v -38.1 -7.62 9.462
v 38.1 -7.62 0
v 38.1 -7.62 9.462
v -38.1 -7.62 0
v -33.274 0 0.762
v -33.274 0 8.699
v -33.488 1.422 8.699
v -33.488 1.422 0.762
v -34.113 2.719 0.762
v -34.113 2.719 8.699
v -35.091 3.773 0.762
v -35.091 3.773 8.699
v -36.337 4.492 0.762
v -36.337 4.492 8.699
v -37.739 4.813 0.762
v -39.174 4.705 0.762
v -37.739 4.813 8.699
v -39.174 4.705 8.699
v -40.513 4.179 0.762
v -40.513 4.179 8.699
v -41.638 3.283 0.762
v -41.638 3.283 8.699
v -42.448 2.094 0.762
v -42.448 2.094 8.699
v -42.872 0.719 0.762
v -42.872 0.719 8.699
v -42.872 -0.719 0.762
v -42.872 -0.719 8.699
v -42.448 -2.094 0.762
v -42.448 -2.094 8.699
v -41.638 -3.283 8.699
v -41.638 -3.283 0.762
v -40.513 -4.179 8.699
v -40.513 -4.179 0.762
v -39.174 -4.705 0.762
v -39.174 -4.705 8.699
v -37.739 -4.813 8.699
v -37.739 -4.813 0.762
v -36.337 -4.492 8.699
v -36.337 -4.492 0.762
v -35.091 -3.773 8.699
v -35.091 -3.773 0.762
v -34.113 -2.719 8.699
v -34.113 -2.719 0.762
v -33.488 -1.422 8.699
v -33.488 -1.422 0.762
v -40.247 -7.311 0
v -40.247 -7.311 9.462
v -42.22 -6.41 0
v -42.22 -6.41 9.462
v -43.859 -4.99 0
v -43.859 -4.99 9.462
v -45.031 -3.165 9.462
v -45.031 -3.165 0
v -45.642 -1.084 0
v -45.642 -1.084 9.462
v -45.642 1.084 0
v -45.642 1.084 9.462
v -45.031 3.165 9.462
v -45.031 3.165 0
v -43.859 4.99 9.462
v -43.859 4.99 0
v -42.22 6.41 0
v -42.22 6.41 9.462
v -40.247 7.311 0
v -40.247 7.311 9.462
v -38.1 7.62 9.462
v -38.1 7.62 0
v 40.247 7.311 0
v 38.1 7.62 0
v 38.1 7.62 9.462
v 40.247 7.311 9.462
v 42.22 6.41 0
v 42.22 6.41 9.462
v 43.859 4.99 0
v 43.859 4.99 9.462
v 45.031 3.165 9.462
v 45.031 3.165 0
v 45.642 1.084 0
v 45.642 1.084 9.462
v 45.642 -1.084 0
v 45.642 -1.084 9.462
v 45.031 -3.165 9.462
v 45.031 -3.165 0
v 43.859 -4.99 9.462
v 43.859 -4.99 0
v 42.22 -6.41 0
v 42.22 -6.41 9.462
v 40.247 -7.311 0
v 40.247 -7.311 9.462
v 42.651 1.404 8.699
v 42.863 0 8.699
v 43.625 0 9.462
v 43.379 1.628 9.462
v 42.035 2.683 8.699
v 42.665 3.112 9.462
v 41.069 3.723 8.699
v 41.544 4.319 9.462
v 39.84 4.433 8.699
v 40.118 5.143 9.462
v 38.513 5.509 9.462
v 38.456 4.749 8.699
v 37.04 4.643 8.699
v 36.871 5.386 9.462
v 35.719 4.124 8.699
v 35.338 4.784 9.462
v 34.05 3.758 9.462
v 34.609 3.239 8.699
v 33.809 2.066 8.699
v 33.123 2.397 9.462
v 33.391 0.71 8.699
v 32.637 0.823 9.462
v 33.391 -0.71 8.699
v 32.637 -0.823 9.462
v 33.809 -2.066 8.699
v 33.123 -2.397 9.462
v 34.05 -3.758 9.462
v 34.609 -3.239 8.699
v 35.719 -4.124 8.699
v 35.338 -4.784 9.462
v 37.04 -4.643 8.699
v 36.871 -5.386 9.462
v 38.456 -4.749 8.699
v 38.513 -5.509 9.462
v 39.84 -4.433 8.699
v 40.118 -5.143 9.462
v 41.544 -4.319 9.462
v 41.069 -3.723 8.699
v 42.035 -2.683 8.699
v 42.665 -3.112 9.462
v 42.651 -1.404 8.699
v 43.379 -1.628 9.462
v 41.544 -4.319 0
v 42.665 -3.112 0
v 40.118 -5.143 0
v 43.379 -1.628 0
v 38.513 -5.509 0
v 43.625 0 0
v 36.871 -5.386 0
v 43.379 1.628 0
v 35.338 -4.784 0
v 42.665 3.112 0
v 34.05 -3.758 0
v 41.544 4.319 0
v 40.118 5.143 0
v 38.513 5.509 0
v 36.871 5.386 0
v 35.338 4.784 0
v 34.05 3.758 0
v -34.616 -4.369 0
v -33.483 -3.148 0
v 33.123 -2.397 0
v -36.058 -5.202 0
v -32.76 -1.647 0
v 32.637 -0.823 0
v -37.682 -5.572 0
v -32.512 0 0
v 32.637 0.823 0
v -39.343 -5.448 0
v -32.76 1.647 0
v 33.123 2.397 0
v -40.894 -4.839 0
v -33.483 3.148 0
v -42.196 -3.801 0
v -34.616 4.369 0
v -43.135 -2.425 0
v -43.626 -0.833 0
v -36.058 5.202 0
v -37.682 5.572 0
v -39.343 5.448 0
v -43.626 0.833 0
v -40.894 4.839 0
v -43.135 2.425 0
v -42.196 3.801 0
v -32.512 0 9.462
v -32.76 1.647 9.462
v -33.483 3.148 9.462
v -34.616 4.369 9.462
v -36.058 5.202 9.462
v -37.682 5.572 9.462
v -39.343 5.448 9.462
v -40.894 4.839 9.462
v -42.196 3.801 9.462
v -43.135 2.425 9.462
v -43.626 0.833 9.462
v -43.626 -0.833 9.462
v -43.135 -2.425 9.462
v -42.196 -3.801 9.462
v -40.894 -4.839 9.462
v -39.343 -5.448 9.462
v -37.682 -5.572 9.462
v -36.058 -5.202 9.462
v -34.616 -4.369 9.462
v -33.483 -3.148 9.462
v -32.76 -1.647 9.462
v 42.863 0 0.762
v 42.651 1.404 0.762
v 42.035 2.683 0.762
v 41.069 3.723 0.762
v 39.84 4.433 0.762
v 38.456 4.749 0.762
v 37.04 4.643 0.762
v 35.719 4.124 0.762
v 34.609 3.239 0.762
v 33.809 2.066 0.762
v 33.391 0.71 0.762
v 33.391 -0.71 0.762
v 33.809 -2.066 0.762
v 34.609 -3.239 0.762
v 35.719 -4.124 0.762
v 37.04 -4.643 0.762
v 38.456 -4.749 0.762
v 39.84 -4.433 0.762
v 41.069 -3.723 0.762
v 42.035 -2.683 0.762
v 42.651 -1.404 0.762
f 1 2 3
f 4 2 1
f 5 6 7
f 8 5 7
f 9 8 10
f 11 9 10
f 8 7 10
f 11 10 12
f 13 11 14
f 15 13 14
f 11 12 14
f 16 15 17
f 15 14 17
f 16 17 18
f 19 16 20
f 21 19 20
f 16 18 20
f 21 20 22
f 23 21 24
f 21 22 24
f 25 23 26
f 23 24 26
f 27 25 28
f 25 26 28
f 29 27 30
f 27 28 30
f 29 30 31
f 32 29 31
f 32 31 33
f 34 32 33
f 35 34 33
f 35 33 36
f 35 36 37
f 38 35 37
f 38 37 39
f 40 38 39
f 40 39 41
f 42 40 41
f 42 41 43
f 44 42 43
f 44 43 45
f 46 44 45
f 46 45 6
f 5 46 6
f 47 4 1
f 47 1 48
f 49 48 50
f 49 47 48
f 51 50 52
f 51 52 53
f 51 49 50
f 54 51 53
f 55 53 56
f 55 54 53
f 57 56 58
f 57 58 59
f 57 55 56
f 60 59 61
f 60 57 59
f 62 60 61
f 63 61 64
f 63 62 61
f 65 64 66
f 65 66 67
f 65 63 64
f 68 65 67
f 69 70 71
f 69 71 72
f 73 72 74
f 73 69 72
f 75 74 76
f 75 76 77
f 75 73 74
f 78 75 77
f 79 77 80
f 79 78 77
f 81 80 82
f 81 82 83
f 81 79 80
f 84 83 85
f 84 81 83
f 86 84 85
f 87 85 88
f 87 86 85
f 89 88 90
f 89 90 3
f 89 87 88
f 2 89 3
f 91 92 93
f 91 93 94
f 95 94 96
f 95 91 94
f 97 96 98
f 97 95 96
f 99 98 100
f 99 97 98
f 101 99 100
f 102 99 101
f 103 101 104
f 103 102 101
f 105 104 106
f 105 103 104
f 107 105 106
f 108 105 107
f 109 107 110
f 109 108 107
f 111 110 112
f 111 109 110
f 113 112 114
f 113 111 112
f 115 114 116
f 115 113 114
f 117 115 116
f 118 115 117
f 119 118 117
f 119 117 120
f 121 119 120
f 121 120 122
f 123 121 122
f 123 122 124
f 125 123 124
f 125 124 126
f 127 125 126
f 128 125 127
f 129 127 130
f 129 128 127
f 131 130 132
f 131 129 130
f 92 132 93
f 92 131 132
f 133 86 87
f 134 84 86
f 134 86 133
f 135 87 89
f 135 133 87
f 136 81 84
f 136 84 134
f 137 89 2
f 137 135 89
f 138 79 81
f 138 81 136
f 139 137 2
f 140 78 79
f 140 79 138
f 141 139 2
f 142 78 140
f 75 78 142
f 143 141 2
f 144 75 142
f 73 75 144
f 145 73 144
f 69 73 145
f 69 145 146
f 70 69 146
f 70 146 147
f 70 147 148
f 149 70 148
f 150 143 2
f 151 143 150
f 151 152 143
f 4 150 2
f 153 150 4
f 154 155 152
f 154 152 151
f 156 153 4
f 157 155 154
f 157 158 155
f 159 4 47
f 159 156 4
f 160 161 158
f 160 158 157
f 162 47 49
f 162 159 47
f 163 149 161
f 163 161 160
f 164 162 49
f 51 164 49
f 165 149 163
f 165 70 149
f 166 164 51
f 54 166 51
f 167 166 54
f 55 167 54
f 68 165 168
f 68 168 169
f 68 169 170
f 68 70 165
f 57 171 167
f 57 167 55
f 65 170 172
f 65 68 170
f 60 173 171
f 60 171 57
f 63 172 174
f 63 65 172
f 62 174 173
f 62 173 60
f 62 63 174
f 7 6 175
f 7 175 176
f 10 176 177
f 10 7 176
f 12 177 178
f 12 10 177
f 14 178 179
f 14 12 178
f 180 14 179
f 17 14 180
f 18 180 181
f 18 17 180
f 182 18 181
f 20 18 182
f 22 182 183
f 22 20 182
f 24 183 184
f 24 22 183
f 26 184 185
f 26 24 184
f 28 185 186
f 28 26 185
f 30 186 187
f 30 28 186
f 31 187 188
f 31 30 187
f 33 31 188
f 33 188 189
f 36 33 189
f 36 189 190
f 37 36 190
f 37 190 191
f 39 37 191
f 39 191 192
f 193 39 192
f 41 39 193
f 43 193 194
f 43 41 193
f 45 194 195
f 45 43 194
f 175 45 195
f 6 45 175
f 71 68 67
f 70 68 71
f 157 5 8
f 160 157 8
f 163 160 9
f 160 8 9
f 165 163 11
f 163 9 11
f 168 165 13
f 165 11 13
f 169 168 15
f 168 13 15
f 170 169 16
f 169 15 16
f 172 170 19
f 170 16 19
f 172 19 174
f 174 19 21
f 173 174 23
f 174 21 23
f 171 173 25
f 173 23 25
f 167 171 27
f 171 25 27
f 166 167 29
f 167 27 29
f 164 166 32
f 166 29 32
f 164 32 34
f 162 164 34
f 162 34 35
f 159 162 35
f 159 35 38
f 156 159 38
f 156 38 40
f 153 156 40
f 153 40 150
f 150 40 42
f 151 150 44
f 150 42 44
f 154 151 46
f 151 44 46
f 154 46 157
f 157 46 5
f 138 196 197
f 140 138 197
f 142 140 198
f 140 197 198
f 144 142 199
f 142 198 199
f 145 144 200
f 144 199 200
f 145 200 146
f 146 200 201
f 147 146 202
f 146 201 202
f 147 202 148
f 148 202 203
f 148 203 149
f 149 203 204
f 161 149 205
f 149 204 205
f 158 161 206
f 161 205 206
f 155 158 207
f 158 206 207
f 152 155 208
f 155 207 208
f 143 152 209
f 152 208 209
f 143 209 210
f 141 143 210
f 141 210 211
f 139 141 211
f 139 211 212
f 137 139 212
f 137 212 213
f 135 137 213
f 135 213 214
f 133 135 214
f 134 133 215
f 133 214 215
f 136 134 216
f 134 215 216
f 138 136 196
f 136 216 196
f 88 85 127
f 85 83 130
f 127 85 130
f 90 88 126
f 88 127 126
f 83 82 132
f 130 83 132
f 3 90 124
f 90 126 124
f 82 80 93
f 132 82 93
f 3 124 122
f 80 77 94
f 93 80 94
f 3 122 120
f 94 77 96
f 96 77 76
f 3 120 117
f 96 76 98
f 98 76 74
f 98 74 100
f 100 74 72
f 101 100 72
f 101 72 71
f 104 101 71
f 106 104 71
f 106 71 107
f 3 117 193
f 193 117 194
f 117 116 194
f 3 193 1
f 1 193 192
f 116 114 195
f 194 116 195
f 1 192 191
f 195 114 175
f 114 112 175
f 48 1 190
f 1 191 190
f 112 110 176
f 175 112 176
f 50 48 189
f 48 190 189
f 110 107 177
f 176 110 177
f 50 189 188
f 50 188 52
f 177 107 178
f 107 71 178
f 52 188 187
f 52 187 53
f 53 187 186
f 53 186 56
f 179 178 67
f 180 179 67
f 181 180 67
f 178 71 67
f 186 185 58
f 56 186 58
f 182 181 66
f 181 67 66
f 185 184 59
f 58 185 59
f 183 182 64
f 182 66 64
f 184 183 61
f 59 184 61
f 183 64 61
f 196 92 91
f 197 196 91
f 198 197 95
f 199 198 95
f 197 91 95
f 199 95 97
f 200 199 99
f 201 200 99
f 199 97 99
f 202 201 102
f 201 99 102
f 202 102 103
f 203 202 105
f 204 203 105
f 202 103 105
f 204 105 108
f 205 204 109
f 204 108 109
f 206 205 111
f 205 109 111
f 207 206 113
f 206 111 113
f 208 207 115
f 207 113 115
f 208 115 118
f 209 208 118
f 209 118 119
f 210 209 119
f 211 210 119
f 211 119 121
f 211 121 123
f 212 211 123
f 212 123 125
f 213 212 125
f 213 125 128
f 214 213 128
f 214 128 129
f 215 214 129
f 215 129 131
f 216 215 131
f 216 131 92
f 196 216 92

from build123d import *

# Parameters (mm, degrees)
BOSS_EXTRUDE1_DEPTH = 9.4615
SKETCH2_R           = 4.7625
SKETCH2_R_2         = 4.826
CUT_EXTRUDE1_DEPTH  = 10.4615
CHAMFER1_SIZE       = 0.762


with BuildPart() as part:
    # Sketch1 → Boss-Extrude1 (new body)
    with BuildSketch(Plane.XY):
        with BuildLine():
            Line((-38.1, 7.62), (38.1, 7.62))
            ThreePointArc((38.1, 7.62), (45.72, 0), (38.1, -7.62))
            Line((38.1, -7.62), (-38.1, -7.62))
            ThreePointArc((-38.1, -7.62), (-45.72, 0), (-38.1, 7.62))
        make_face()
    extrude(amount=BOSS_EXTRUDE1_DEPTH)

    # Sketch2 → Cut-Extrude1 (cut, through all)
    with BuildSketch(Plane.XY.offset(9.4615)):
        with Locations((38.1, 0)):
            Circle(SKETCH2_R)
        with Locations((-38.1, 0)):
            Circle(SKETCH2_R_2)
    extrude(amount=-CUT_EXTRUDE1_DEPTH, mode=Mode.SUBTRACT)

    # Chamfer1
    chamfer1_edges = [part.edges().sort_by_distance(p)[0] for p in [
        (33.3375, 0, 0),
        (33.3375, 0, 9.4615),
        (-42.926, 0, 0),
        (-42.926, 0, 9.4615),
    ]]
    chamfer(chamfer1_edges, length=CHAMFER1_SIZE)


solid = part.part
